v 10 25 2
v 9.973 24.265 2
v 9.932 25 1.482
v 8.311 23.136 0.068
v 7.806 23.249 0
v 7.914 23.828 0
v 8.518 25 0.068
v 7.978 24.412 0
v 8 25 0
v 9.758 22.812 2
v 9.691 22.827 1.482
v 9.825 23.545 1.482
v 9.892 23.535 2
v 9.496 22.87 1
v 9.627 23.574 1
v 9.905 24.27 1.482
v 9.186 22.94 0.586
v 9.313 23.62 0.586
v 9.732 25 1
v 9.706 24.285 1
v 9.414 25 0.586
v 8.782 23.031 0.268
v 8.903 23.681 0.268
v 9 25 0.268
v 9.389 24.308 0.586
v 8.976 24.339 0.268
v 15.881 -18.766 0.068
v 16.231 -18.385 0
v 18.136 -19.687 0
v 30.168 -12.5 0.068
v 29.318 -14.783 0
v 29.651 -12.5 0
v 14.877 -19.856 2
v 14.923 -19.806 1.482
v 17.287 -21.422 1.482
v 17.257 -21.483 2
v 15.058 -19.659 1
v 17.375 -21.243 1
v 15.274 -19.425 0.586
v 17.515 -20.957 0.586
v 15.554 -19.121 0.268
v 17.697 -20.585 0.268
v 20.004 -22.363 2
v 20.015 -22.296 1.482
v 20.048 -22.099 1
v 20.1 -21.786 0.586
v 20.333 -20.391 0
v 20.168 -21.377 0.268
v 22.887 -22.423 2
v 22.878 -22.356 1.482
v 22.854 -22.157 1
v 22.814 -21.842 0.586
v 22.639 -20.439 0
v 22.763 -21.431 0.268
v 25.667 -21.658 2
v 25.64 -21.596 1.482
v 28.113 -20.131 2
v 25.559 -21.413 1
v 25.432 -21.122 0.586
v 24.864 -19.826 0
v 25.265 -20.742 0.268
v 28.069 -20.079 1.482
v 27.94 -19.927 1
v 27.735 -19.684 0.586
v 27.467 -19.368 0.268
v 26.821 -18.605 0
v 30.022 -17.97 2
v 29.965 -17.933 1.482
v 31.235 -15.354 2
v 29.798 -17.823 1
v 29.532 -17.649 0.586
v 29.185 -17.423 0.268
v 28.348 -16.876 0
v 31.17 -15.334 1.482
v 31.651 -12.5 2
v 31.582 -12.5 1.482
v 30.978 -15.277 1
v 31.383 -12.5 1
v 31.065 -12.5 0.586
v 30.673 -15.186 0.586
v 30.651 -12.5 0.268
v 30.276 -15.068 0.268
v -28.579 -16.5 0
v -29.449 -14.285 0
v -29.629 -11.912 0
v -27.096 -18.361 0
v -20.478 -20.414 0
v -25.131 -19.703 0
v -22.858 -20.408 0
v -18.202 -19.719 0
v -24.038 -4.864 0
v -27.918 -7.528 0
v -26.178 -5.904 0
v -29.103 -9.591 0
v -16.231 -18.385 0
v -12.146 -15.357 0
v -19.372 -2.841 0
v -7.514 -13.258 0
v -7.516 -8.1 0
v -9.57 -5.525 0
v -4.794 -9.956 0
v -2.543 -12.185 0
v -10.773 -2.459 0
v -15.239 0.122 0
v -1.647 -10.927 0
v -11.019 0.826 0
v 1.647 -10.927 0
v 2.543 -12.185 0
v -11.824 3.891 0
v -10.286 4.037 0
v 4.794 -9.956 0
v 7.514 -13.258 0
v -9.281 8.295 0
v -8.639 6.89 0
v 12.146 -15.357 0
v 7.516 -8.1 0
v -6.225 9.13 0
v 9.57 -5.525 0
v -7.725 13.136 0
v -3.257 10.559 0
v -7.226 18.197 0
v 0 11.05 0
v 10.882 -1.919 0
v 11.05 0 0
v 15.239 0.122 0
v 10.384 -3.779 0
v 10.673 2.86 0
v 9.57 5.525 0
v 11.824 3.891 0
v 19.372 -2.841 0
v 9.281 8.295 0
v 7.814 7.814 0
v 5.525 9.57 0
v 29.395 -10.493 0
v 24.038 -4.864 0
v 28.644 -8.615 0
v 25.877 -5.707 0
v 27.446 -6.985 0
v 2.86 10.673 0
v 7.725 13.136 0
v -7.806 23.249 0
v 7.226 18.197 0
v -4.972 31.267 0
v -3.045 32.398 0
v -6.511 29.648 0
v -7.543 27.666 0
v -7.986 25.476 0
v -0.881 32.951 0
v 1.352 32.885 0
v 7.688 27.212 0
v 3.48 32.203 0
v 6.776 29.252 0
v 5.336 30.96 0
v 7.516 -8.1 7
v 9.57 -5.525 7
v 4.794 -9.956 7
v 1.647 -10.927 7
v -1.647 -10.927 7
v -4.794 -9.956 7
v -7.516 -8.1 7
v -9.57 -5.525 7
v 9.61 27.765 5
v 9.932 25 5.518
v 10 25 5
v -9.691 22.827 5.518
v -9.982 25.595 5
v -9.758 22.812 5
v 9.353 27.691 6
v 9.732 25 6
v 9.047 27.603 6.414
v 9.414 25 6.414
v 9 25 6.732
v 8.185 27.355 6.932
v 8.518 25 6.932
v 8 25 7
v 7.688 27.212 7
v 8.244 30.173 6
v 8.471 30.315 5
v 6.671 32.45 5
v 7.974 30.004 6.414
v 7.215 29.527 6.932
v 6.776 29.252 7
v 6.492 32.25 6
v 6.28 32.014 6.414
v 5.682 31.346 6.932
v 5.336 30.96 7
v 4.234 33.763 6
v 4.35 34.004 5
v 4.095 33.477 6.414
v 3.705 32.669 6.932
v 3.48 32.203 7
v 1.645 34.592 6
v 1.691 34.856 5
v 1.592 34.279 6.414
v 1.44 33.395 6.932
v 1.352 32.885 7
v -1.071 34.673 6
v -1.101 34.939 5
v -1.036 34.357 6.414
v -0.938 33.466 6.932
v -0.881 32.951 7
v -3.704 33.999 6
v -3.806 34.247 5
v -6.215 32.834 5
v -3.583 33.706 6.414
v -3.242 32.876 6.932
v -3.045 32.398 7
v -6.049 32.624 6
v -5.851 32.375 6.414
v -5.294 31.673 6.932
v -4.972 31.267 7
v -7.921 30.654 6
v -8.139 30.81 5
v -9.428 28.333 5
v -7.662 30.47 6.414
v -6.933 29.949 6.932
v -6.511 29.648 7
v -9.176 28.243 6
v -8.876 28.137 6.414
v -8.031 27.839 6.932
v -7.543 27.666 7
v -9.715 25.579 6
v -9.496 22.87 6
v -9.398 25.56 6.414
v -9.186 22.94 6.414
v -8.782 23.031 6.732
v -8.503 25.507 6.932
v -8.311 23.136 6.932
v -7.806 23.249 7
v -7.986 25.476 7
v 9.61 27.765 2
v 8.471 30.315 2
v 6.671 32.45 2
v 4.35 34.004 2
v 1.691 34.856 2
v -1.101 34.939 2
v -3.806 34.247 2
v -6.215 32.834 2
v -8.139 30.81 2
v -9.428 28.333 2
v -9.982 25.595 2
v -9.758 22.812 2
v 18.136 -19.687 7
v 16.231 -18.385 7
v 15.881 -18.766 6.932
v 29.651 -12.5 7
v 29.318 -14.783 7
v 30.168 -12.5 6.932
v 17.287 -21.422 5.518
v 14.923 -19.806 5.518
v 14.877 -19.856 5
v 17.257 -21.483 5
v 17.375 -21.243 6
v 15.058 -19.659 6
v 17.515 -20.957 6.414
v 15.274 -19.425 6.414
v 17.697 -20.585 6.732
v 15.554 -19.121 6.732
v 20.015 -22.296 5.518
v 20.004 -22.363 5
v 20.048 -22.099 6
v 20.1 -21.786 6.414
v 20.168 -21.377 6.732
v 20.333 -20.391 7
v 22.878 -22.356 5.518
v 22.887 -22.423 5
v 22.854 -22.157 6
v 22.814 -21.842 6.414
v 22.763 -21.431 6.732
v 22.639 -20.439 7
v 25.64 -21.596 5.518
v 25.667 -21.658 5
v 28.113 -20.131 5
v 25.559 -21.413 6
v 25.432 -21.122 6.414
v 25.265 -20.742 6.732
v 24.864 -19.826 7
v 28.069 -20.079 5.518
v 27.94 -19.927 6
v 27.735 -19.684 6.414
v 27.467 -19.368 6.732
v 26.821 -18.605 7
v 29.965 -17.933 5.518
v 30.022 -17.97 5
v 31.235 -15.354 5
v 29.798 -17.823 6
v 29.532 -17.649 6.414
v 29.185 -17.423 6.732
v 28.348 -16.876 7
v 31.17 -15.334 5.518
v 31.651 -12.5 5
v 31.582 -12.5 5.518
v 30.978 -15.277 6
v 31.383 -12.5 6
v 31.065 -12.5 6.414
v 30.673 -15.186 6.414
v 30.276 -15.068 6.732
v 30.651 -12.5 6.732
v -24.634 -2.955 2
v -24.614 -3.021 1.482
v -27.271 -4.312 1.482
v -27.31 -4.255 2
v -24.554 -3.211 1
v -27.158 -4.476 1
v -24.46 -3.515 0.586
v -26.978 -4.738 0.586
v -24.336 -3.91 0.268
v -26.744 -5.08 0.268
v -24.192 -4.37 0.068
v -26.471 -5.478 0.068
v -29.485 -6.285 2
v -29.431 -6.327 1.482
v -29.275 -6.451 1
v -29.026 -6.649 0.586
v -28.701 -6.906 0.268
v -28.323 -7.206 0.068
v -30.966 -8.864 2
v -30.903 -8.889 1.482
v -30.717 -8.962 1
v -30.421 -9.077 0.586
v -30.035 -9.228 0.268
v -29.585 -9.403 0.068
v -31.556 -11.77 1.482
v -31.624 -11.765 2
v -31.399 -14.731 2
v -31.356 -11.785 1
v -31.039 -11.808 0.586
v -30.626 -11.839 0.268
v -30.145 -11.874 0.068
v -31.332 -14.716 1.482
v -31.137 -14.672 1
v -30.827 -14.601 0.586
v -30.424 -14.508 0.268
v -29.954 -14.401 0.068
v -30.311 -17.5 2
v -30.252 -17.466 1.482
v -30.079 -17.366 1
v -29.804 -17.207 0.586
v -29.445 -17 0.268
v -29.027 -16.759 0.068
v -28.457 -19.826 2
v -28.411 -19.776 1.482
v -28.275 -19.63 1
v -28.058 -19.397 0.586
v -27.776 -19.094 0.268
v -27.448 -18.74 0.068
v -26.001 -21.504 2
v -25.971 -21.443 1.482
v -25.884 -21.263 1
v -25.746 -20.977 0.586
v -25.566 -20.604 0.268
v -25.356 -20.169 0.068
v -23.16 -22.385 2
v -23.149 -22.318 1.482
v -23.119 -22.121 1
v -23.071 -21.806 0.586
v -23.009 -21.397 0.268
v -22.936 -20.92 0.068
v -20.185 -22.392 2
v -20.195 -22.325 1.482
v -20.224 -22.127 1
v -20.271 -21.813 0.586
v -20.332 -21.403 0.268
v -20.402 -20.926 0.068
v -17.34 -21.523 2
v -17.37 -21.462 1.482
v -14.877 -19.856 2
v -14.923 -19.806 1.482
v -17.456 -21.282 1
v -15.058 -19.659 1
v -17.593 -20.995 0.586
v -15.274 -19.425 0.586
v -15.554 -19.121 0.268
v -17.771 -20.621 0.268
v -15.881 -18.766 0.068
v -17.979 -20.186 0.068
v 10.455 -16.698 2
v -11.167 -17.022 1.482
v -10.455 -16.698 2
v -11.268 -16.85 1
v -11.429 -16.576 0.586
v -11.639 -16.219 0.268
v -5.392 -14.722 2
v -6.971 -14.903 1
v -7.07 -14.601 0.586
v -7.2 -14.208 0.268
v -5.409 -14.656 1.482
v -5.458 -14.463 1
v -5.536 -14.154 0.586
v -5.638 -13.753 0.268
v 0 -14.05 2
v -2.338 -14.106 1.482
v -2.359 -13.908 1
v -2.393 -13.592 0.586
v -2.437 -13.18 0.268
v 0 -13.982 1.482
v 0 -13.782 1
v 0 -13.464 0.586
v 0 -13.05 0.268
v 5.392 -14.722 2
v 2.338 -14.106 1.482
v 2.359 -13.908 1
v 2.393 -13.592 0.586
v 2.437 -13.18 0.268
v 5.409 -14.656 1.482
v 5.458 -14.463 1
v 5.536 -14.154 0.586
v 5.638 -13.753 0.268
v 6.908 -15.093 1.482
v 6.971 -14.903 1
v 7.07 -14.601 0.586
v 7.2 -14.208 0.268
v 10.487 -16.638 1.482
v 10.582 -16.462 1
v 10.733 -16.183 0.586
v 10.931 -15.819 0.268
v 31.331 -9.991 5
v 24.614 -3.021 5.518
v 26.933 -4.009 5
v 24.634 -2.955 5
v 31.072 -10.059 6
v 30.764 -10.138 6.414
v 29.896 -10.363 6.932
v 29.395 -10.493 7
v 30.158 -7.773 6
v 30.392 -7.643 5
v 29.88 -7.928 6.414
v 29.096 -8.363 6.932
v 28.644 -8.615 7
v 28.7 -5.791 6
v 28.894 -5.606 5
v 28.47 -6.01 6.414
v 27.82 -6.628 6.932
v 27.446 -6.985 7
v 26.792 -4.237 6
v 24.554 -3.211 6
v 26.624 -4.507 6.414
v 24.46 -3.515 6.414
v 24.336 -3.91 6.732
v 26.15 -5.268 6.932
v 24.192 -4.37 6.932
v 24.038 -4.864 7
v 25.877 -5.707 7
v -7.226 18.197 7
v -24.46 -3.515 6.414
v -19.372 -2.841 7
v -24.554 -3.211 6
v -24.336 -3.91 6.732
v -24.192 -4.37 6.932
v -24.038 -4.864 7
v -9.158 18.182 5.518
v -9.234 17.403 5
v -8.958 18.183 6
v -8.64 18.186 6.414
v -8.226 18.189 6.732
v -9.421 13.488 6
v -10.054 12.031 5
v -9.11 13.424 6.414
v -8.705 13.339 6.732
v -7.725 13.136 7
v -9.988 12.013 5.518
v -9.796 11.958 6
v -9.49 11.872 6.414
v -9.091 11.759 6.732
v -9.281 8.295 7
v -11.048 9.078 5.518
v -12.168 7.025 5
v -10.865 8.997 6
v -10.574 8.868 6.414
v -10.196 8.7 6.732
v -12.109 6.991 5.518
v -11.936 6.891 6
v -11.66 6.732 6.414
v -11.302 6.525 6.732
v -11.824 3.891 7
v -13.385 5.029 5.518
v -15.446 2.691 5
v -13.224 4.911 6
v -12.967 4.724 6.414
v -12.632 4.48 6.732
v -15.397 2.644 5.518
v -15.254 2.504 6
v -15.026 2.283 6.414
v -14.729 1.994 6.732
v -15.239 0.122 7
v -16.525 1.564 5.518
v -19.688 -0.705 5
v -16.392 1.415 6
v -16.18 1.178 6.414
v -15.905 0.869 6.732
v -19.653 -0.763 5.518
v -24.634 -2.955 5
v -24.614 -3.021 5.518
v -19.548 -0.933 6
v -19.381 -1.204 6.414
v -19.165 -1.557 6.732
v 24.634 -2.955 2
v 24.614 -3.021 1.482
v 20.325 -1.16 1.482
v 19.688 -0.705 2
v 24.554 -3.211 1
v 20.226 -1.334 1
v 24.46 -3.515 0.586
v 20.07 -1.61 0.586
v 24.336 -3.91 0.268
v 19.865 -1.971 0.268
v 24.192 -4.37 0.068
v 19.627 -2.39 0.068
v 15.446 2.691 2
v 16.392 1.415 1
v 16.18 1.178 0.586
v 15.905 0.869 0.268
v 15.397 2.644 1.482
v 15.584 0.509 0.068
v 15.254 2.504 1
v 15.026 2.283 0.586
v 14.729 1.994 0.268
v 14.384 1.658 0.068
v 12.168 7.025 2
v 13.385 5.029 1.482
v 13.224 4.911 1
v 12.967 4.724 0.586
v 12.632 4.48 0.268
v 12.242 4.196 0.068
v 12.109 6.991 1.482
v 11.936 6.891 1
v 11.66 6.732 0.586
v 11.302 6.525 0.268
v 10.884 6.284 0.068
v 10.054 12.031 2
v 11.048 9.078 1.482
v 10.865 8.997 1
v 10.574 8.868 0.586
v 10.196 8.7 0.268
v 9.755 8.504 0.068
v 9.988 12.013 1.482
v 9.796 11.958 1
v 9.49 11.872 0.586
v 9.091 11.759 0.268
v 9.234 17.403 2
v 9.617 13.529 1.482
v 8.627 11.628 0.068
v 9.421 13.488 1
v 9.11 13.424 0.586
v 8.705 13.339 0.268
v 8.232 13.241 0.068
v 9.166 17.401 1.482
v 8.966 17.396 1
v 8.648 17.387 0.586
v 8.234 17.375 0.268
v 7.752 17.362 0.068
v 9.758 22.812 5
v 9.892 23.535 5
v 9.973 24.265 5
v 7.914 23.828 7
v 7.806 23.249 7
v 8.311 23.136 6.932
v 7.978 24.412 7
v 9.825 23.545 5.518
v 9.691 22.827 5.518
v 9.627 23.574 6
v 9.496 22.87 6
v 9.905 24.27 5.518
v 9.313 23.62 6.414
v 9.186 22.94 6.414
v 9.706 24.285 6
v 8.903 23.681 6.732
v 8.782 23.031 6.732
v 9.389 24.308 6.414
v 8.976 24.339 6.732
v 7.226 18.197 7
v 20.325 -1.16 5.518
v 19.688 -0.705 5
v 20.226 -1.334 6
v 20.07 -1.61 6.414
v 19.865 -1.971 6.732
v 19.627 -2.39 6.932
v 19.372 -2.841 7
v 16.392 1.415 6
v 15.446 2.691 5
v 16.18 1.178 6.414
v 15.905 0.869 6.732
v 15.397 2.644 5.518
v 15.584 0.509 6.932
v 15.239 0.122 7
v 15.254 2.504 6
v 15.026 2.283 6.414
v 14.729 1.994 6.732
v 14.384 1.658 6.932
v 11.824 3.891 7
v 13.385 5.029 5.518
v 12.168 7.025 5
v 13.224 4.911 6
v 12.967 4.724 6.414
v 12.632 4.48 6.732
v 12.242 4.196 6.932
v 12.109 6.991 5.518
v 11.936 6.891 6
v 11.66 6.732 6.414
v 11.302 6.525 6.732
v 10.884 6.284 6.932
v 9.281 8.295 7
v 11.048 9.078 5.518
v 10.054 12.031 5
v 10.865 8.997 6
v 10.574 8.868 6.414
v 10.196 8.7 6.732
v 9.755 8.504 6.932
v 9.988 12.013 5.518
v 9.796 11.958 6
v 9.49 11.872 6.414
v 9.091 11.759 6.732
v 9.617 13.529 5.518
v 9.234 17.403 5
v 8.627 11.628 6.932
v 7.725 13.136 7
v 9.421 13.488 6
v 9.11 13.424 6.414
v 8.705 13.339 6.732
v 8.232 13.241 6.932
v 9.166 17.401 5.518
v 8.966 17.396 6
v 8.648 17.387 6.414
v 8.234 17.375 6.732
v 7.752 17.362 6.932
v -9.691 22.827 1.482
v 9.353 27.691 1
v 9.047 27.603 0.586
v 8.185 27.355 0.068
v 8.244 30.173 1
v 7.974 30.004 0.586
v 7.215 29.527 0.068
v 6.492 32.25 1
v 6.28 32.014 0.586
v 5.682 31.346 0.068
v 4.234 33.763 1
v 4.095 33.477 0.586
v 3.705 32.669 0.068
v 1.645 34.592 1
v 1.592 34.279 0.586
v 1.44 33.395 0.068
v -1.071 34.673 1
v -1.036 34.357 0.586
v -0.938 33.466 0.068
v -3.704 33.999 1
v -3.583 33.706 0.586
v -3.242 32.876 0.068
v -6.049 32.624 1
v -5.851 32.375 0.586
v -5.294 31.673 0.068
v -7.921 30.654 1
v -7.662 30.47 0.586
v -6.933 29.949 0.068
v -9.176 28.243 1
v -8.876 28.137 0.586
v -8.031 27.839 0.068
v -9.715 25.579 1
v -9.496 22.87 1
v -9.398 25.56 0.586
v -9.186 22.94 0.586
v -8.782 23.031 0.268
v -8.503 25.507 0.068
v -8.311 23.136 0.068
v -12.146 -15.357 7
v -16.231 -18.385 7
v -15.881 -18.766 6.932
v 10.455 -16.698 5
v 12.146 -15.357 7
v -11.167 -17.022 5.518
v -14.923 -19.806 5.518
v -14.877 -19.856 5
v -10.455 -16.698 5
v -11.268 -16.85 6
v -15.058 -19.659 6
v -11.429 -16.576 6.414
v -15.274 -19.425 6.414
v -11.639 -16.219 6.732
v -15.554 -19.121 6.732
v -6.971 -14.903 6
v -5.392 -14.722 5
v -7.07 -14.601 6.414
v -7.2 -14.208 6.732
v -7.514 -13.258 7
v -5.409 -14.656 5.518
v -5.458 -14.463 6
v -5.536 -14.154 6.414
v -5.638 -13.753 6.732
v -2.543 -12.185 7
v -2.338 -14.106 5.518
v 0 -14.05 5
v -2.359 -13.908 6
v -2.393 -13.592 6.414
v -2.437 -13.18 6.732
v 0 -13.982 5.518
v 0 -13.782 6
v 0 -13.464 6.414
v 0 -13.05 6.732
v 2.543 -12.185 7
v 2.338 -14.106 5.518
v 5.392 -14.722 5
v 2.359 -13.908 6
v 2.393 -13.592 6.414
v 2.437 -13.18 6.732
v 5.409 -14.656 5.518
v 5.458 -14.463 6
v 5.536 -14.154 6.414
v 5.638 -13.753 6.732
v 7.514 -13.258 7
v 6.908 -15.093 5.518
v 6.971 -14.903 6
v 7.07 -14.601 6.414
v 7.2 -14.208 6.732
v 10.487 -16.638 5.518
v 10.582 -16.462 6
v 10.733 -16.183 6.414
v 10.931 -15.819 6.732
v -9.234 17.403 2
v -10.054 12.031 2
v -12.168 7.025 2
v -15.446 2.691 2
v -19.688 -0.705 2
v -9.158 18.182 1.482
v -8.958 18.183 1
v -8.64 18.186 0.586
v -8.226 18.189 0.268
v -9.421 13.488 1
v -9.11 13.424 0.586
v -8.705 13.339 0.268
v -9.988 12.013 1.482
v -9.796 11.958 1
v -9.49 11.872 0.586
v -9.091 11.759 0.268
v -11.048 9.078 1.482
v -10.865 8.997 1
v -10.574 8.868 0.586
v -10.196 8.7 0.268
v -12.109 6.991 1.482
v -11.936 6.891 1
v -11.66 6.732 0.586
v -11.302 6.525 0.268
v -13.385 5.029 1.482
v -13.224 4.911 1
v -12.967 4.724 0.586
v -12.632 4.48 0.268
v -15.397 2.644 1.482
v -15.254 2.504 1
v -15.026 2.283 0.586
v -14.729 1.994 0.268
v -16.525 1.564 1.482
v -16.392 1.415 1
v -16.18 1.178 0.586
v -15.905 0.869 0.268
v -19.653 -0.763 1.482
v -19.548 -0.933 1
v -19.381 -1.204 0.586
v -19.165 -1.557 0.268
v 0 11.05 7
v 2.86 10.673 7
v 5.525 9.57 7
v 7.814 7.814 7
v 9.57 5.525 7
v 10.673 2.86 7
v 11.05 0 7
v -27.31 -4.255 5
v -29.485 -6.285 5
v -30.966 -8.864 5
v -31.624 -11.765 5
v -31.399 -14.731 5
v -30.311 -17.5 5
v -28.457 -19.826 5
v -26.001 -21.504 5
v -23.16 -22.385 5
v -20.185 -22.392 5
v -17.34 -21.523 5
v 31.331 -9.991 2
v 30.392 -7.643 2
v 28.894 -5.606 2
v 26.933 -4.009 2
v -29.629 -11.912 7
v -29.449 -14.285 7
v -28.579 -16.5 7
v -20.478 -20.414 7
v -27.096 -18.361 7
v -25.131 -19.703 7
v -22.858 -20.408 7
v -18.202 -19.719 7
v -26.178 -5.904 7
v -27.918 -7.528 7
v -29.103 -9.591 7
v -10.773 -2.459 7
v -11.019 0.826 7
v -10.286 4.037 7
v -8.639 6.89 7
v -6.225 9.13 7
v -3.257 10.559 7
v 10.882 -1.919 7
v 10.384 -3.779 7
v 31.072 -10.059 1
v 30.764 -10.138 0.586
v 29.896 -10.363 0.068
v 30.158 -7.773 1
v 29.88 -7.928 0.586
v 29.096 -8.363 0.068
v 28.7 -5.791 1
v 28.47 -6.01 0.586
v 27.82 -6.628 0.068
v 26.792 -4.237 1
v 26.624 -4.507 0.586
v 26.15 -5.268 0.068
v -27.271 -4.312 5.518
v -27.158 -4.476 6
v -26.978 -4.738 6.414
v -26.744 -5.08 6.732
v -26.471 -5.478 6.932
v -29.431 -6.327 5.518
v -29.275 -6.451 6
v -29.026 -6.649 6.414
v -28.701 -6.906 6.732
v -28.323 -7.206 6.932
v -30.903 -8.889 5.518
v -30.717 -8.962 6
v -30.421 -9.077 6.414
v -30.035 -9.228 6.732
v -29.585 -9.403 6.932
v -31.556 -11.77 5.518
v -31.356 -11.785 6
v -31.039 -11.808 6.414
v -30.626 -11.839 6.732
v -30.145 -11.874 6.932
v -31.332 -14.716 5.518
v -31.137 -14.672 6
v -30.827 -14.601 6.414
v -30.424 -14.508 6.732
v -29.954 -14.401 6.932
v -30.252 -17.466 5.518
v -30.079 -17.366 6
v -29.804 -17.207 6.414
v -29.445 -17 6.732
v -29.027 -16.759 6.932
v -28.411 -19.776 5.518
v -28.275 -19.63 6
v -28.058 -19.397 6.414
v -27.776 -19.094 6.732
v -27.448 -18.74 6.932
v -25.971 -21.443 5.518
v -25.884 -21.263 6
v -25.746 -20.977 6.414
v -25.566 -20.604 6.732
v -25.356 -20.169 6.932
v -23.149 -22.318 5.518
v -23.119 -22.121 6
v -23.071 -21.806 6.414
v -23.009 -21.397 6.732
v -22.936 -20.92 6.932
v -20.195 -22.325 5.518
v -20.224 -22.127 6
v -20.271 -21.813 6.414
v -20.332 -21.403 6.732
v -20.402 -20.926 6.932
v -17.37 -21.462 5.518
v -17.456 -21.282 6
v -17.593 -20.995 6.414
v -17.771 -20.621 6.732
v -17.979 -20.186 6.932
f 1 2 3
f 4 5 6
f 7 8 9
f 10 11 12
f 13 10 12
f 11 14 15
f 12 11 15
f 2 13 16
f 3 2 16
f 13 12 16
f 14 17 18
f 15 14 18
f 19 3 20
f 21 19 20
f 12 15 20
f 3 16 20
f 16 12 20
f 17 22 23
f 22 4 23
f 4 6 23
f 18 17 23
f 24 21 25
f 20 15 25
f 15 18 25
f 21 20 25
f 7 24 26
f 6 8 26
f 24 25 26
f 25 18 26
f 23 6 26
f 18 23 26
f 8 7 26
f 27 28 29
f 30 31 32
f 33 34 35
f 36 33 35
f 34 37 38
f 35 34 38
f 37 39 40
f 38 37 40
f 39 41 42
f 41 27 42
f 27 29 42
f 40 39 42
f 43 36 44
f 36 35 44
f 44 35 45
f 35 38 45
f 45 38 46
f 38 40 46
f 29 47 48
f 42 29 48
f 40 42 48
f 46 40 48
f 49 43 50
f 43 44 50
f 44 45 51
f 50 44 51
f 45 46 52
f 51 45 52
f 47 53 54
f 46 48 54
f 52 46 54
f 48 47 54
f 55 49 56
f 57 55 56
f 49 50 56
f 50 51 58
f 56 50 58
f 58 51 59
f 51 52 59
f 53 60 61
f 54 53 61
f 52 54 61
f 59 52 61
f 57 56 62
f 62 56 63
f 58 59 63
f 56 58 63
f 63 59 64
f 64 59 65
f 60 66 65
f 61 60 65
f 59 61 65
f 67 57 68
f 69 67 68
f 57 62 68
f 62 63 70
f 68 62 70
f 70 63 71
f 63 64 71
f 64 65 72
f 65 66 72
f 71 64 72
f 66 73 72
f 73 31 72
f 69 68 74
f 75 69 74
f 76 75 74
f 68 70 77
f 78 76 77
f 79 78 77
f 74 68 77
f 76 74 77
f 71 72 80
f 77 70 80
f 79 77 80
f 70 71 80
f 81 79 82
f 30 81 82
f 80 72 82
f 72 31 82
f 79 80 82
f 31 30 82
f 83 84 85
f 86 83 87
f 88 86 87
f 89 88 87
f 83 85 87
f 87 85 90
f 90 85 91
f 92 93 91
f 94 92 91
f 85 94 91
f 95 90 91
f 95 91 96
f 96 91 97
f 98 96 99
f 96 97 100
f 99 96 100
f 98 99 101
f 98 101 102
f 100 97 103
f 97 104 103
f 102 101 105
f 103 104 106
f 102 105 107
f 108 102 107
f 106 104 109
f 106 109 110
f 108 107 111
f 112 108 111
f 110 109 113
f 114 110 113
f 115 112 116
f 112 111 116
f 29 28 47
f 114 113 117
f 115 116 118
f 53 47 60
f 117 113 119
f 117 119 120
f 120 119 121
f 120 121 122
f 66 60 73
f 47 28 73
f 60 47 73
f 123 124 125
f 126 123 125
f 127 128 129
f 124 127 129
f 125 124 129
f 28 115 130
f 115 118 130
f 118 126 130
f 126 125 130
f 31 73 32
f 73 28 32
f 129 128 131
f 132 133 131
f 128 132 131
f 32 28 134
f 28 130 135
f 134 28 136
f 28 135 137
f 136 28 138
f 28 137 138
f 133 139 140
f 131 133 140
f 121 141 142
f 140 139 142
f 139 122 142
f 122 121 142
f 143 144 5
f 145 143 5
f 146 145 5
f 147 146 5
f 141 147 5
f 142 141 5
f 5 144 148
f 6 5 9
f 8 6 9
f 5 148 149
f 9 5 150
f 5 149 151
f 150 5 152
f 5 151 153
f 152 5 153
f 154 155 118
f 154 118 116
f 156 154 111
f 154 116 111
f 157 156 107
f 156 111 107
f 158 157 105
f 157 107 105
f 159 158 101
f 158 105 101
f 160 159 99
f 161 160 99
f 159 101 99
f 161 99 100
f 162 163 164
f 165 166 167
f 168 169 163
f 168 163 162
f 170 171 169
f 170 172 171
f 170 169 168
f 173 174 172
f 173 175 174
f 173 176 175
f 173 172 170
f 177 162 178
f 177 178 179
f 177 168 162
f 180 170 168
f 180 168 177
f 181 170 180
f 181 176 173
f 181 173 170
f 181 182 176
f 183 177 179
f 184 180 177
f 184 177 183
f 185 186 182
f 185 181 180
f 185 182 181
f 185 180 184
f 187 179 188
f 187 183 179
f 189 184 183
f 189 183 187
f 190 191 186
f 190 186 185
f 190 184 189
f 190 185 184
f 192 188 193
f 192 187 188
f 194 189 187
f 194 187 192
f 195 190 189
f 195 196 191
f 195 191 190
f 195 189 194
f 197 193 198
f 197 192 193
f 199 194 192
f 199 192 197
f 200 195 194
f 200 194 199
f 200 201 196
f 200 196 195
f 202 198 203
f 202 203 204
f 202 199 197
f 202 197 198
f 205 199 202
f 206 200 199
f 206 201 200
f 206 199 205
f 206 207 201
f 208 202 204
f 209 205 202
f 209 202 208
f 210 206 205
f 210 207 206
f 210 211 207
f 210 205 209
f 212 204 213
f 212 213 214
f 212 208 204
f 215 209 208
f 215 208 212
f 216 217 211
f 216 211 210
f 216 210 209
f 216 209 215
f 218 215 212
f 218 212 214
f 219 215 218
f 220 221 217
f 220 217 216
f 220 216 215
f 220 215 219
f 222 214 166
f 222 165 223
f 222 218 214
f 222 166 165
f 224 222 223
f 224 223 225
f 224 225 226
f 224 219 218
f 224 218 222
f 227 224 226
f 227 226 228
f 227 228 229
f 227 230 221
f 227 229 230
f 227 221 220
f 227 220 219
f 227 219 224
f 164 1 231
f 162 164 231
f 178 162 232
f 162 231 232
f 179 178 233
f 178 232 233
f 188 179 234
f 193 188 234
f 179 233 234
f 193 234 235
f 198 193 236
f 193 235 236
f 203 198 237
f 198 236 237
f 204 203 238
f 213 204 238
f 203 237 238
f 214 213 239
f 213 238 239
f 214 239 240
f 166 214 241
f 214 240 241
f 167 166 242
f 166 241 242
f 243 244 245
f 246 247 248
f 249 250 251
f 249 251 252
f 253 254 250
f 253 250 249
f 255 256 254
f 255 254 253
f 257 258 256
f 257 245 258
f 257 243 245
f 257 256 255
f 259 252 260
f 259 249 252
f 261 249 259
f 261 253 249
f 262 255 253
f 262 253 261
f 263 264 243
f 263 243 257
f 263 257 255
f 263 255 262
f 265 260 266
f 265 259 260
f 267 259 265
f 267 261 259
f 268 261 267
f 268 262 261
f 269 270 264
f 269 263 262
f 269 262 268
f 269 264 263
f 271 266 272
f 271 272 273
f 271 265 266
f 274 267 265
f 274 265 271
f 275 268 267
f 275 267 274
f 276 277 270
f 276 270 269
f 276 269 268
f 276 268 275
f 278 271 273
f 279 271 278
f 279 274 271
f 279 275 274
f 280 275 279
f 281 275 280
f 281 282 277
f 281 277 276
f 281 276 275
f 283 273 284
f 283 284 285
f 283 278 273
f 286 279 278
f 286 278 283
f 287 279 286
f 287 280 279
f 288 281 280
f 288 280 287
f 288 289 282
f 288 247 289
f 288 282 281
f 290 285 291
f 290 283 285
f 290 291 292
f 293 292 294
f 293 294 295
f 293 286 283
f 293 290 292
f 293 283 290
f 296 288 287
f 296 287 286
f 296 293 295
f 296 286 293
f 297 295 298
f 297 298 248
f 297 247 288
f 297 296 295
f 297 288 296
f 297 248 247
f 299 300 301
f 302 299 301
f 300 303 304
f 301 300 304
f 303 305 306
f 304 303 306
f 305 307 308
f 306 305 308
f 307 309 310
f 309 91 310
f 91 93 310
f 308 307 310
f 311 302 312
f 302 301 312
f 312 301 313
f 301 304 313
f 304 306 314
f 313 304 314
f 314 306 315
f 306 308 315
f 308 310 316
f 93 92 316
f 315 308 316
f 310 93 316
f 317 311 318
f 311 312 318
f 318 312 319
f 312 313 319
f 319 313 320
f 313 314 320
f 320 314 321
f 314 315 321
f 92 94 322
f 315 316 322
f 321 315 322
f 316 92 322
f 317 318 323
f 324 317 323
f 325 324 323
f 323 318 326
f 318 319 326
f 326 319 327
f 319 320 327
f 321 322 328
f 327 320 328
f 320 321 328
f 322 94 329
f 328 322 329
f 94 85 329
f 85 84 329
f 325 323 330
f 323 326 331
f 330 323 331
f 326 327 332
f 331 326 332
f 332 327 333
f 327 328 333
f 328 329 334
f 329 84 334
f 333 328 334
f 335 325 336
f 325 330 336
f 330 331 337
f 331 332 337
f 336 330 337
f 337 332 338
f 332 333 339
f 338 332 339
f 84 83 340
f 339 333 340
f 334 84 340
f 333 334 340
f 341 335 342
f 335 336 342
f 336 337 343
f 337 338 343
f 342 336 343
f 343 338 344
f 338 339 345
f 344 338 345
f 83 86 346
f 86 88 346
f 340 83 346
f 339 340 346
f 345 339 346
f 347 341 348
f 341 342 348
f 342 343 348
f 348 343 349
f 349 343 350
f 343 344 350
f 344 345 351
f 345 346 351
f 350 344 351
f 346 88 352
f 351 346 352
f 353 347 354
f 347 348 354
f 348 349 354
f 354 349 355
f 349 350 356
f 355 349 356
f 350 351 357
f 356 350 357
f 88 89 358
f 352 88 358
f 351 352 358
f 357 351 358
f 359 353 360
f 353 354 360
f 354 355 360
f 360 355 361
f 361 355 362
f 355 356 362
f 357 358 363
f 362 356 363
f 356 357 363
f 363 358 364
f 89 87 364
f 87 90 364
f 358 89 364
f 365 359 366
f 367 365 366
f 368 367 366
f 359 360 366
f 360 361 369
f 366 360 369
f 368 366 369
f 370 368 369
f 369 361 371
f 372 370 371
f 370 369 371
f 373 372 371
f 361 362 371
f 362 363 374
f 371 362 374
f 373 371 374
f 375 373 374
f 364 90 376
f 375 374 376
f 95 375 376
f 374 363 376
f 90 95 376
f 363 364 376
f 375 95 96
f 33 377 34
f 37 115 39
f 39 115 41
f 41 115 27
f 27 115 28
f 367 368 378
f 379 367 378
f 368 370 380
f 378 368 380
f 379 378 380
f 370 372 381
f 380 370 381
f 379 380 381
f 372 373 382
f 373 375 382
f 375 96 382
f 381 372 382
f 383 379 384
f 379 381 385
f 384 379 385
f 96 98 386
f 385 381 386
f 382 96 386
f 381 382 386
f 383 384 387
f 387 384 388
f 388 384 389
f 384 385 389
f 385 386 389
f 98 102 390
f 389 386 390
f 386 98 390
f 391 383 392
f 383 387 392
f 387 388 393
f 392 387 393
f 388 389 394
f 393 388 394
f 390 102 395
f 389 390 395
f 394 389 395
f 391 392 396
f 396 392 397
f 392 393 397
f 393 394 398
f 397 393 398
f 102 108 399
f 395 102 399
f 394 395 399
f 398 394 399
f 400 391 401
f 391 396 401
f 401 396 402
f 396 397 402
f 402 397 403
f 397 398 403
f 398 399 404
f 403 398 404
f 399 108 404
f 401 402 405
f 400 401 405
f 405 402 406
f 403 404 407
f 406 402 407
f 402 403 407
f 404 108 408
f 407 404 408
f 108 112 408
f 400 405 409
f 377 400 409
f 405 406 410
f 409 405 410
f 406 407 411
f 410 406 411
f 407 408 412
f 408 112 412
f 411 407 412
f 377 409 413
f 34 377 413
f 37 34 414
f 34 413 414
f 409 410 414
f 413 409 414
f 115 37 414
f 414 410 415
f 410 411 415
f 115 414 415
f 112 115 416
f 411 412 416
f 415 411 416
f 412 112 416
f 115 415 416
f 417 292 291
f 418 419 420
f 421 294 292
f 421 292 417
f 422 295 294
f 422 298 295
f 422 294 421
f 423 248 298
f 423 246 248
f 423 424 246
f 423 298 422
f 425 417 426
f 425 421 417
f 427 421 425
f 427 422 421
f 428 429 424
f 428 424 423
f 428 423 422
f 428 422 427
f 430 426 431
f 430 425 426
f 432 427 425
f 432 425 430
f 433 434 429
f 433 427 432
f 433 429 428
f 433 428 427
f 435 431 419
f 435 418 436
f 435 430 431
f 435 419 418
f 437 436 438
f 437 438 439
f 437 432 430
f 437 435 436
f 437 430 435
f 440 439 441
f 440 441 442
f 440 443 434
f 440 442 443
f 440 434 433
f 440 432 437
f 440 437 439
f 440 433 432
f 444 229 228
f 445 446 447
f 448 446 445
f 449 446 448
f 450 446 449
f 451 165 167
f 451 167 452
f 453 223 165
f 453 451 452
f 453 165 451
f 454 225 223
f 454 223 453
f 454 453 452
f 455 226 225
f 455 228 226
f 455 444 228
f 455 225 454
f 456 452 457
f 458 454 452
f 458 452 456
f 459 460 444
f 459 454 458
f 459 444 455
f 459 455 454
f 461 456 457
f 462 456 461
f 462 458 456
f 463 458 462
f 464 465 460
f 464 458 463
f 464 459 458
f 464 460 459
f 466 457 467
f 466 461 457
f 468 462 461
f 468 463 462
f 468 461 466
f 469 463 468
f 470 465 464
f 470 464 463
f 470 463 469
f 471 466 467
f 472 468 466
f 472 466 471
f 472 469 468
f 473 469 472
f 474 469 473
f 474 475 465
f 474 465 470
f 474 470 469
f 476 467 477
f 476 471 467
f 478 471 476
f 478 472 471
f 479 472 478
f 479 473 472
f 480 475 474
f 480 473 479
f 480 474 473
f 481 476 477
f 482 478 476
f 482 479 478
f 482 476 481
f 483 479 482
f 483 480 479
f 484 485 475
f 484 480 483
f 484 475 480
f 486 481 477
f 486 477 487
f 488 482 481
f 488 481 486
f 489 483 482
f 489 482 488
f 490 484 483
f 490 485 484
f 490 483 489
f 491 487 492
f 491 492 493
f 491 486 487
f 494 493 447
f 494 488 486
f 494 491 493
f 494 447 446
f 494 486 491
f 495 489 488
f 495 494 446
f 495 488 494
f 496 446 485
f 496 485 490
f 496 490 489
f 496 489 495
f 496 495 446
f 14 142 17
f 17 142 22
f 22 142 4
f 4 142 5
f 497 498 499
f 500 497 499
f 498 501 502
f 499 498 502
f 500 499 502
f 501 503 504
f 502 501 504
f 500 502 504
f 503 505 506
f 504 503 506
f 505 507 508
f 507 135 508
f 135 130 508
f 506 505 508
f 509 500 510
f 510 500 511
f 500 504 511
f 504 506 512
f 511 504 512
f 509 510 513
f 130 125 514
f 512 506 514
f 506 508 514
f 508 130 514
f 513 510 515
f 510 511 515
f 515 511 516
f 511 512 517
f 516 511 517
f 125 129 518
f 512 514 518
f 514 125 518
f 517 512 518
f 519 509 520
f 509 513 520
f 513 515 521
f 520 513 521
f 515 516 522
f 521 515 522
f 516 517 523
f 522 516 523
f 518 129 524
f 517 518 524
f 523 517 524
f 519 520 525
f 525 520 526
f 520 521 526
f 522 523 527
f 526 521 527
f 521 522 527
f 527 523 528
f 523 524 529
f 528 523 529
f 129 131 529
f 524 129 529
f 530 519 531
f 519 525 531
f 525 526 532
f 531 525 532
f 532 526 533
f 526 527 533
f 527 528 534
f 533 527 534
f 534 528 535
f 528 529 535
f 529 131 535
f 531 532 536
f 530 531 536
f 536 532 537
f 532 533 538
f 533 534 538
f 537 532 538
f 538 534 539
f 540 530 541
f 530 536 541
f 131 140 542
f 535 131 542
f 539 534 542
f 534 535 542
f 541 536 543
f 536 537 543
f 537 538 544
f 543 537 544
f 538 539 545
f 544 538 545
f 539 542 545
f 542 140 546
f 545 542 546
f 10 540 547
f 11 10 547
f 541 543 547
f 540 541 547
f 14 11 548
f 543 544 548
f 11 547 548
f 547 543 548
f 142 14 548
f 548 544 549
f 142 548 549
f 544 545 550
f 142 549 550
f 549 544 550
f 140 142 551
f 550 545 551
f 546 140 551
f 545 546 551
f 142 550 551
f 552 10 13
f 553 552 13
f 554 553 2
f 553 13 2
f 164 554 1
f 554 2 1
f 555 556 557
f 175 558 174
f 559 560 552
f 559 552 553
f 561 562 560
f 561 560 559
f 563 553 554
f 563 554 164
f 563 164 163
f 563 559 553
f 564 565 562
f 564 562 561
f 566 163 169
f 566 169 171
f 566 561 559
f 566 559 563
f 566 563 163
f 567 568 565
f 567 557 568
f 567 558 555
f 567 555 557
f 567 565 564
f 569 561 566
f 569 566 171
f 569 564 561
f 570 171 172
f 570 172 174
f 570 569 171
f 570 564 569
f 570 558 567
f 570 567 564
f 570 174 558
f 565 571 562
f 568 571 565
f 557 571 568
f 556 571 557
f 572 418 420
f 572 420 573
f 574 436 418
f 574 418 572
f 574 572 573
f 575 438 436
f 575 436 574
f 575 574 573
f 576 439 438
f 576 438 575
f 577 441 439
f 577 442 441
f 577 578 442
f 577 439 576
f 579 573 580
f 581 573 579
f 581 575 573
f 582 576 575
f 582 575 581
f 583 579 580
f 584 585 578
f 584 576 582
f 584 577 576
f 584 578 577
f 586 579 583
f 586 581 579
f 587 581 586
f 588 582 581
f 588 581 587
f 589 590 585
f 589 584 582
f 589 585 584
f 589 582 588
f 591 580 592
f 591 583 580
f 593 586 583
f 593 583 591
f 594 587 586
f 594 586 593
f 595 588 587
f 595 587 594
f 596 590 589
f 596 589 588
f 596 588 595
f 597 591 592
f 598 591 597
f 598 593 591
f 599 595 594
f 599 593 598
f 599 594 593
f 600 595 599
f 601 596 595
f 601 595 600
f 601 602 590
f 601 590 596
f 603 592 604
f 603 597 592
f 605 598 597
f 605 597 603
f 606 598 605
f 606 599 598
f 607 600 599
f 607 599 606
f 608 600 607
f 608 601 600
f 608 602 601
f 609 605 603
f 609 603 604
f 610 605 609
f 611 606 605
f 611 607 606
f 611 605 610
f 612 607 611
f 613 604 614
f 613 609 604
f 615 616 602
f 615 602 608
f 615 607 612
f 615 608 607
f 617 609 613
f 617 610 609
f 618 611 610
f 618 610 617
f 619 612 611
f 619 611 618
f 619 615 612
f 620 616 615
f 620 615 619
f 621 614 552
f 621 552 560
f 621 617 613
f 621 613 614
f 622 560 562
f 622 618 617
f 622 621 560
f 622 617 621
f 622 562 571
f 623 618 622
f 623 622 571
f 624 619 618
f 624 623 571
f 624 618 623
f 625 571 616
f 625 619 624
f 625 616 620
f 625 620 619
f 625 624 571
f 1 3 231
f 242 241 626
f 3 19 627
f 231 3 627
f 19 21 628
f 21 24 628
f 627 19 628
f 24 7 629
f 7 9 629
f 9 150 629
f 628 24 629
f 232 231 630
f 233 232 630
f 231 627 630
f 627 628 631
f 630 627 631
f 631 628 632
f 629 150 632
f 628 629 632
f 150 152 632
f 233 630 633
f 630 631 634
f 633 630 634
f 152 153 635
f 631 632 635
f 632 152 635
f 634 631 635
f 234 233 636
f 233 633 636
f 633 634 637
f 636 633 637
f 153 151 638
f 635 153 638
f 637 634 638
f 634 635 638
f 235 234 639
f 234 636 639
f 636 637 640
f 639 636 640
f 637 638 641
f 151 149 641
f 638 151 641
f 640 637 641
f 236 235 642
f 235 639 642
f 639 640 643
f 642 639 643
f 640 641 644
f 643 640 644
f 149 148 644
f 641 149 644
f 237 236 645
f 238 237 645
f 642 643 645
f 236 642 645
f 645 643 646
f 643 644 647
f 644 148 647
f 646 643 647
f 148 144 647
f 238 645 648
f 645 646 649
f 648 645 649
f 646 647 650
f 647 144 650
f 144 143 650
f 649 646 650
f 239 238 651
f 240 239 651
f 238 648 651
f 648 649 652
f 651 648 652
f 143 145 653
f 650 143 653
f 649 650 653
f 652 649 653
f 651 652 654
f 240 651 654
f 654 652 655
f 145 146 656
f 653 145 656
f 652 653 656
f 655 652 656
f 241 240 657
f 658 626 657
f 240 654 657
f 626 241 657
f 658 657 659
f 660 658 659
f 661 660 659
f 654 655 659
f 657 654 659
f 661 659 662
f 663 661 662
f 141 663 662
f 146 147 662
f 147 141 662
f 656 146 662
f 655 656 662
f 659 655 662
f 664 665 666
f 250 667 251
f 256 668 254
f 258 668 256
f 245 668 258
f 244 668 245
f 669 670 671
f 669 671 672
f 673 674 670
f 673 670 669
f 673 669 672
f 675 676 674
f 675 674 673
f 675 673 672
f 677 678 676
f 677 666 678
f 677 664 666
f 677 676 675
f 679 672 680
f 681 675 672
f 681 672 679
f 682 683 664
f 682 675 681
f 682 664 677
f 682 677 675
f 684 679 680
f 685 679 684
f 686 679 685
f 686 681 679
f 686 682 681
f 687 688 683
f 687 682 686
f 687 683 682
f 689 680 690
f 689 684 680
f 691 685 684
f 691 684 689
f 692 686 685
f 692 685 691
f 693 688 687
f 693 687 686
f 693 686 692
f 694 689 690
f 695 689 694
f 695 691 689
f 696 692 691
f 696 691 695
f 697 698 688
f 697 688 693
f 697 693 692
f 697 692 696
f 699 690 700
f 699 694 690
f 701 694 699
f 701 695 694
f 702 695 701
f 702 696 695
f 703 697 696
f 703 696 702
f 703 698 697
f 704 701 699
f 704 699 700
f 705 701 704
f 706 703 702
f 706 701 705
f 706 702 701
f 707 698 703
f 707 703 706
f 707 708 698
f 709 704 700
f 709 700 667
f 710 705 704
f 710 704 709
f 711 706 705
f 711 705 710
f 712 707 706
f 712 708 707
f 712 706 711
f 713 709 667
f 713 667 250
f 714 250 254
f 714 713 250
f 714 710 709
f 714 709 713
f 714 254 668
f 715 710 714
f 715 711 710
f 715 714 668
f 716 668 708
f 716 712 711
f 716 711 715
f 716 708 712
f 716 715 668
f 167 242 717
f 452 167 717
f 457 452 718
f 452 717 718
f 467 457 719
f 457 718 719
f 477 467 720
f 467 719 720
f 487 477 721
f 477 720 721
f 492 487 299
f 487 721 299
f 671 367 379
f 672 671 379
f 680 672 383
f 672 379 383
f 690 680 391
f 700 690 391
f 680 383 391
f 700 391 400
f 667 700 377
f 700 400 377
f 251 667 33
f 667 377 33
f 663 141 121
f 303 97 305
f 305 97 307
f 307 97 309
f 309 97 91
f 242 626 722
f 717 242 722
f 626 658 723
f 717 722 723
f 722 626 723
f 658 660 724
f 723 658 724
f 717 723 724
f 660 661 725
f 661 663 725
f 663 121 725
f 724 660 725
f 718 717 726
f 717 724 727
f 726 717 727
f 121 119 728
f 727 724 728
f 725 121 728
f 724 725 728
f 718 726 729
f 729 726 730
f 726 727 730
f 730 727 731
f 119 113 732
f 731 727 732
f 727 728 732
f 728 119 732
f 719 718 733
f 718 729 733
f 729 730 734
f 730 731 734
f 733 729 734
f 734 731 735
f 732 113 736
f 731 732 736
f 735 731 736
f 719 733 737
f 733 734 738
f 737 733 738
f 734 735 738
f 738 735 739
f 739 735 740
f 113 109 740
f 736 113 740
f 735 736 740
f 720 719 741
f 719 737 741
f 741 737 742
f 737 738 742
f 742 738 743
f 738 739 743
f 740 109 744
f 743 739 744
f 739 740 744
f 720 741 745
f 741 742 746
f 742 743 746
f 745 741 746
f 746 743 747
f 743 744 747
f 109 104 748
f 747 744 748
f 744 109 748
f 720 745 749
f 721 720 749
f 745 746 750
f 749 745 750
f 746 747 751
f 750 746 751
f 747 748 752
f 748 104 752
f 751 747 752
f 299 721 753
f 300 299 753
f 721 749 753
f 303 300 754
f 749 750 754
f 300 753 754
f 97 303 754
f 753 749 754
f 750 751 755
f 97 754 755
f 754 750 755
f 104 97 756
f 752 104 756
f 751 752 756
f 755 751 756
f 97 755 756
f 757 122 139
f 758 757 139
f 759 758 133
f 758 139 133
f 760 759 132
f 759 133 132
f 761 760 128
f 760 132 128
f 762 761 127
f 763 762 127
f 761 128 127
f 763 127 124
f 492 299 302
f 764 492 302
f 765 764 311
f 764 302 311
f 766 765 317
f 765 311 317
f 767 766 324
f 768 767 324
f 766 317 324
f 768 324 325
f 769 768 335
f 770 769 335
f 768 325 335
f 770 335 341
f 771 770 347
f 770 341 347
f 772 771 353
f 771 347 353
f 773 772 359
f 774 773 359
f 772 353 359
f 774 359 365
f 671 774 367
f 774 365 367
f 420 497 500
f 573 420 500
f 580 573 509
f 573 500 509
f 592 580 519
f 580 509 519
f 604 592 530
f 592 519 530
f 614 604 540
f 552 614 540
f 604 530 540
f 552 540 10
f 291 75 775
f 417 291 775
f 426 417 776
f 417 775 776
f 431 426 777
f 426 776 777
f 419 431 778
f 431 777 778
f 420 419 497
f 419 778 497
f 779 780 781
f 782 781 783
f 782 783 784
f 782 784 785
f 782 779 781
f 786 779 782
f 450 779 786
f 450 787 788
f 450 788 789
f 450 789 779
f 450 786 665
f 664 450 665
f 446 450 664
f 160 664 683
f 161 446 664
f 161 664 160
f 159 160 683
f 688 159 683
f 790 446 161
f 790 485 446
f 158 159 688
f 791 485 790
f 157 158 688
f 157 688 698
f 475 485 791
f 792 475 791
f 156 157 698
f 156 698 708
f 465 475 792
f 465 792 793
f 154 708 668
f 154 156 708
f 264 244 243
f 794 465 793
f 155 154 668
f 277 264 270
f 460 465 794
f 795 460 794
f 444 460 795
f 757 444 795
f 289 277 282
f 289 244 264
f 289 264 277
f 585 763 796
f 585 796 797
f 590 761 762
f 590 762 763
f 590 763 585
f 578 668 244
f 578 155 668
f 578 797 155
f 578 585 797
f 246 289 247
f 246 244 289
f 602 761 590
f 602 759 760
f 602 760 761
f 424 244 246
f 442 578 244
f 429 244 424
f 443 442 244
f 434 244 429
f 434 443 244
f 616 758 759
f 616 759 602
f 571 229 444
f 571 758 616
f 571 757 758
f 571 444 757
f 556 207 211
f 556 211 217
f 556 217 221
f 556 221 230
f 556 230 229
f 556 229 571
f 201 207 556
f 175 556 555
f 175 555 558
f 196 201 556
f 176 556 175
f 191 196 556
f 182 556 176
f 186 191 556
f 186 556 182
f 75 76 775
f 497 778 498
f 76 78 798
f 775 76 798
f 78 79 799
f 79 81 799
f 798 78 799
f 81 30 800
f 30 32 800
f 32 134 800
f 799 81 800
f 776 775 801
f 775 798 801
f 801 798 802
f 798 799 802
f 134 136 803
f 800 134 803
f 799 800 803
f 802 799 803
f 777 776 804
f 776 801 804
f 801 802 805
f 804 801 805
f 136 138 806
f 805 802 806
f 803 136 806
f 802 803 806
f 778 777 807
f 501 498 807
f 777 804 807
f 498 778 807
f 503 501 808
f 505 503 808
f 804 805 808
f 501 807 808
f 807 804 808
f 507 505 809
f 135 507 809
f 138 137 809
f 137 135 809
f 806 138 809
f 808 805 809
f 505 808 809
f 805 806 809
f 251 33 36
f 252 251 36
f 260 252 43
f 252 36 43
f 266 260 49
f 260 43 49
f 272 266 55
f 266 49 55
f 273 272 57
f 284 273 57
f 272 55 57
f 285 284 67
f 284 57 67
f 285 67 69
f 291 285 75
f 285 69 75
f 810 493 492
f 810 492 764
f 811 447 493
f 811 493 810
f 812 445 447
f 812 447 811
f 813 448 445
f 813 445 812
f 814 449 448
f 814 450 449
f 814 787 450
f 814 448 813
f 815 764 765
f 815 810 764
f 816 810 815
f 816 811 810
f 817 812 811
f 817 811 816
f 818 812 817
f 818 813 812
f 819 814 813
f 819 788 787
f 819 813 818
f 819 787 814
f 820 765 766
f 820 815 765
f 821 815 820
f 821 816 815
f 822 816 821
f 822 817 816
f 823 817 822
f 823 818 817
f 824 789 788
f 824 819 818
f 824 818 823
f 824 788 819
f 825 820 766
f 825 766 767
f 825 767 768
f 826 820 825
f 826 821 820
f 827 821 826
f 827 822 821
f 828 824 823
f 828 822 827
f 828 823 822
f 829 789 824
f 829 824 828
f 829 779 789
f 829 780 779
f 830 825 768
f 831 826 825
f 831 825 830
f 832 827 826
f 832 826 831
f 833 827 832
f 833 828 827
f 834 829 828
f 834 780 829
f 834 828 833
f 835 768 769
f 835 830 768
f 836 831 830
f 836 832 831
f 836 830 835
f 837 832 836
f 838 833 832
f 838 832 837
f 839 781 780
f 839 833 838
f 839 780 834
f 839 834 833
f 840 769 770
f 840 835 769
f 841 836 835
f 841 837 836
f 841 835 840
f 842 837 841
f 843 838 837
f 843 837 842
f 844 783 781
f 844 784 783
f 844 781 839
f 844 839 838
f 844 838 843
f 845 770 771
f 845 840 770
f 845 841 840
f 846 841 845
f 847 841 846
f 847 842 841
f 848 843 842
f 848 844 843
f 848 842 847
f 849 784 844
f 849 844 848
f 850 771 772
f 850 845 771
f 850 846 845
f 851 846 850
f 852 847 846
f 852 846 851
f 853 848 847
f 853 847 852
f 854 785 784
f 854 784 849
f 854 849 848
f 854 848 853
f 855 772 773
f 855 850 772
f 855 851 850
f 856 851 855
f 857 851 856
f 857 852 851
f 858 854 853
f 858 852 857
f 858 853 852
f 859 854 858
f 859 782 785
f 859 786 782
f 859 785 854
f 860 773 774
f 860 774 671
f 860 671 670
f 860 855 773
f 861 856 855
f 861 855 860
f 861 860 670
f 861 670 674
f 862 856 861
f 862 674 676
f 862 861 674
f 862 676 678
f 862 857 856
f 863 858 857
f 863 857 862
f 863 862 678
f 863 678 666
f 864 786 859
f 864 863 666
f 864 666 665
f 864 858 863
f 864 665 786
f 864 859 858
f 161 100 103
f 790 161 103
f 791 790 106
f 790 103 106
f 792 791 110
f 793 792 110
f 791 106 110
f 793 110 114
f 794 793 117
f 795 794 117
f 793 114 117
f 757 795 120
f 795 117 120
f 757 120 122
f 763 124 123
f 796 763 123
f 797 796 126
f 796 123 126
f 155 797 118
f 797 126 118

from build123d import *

# Parameters (mm, degrees)
F1_DEPTH = 7
F2_R     = 2


with BuildPart() as f1:
    # F0 (on Top) → F1 (new body)
    with BuildSketch(Plane.XY):
        with BuildLine():
            ThreePointArc((-11.650635, -12.5), (-11.991377, -9.91181), (-12.990381, -7.5))
            ThreePointArc((-12.990381, -7.5), (-18.014847, -3.184365), (-24.634333, -2.955496))
            ThreePointArc((-24.634333, -2.955496), (-30.310889, -17.5), (-14.876701, -19.85621))
            ThreePointArc((-14.876701, -19.85621), (-12.492597, -16.516258), (-11.650635, -12.5))
        make_face()
        with BuildLine():
            ThreePointArc((-9.569581, -5.525), (-9.569581, 5.525), (0, 11.05))
            Line((0, 11.05), (0, 15))
            ThreePointArc((0, 15), (-6.249682, 17.193498), (-9.757631, 22.811706))
            ThreePointArc((-9.757631, 22.811706), (-12.167657, 7.025), (-24.634333, -2.955496))
            ThreePointArc((-24.634333, -2.955496), (-18.014847, -3.184365), (-12.990381, -7.5))
            Line((-12.990381, -7.5), (-9.569581, -5.525))
        make_face()
        with BuildLine():
            ThreePointArc((0, 11.05), (7.81353, 7.81353), (11.05, 0))
            ThreePointArc((11.05, 0), (10.67348, -2.85995), (9.569581, -5.525))
            Line((9.569581, -5.525), (12.990381, -7.5))
            ThreePointArc((12.990381, -7.5), (18.014847, -3.184365), (24.634333, -2.955496))
            ThreePointArc((24.634333, -2.955496), (12.167657, 7.025), (9.757631, 22.811706))
            ThreePointArc((9.757631, 22.811706), (6.249682, 17.193498), (0, 15))
            Line((0, 15), (0, 11.05))
        make_face()
        with BuildLine():
            ThreePointArc((-9.757631, 22.811706), (-6.249682, 17.193498), (0, 15))
            ThreePointArc((0, 15), (6.249682, 17.193498), (9.757631, 22.811706))
            ThreePointArc((9.757631, 22.811706), (9.939223, 23.899162), (10, 25))
            ThreePointArc((10, 25), (-1.100838, 34.939223), (-9.757631, 22.811706))
        make_face()
        with BuildLine():
            ThreePointArc((24.634333, -2.955496), (18.014847, -3.184365), (12.990381, -7.5))
            ThreePointArc((12.990381, -7.5), (11.765165, -14.009133), (14.876701, -19.85621))
            ThreePointArc((14.876701, -19.85621), (25.666893, -21.658039), (31.650635, -12.5))
            ThreePointArc((31.650635, -12.5), (29.707836, -6.577035), (24.634333, -2.955496))
        make_face()
        with BuildLine():
            Line((12.990381, -7.5), (9.569581, -5.525))
            ThreePointArc((9.569581, -5.525), (0, -11.05), (-9.569581, -5.525))
            Line((-9.569581, -5.525), (-12.990381, -7.5))
            ThreePointArc((-12.990381, -7.5), (-11.991377, -9.91181), (-11.650635, -12.5))
            ThreePointArc((-11.650635, -12.5), (-12.492597, -16.516258), (-14.876701, -19.85621))
            ThreePointArc((-14.876701, -19.85621), (0, -14.05), (14.876701, -19.85621))
            ThreePointArc((14.876701, -19.85621), (11.765165, -14.009133), (12.990381, -7.5))
        make_face()
    extrude(amount=F1_DEPTH)

    # F2
    f2_edges = [f1.edges().sort_by_distance(p)[0] for p in [
        (0, -14.05, 7),
        (0, -14.05, 0),
    ]]
    fillet(f2_edges, radius=F2_R)


solid = f1.part
